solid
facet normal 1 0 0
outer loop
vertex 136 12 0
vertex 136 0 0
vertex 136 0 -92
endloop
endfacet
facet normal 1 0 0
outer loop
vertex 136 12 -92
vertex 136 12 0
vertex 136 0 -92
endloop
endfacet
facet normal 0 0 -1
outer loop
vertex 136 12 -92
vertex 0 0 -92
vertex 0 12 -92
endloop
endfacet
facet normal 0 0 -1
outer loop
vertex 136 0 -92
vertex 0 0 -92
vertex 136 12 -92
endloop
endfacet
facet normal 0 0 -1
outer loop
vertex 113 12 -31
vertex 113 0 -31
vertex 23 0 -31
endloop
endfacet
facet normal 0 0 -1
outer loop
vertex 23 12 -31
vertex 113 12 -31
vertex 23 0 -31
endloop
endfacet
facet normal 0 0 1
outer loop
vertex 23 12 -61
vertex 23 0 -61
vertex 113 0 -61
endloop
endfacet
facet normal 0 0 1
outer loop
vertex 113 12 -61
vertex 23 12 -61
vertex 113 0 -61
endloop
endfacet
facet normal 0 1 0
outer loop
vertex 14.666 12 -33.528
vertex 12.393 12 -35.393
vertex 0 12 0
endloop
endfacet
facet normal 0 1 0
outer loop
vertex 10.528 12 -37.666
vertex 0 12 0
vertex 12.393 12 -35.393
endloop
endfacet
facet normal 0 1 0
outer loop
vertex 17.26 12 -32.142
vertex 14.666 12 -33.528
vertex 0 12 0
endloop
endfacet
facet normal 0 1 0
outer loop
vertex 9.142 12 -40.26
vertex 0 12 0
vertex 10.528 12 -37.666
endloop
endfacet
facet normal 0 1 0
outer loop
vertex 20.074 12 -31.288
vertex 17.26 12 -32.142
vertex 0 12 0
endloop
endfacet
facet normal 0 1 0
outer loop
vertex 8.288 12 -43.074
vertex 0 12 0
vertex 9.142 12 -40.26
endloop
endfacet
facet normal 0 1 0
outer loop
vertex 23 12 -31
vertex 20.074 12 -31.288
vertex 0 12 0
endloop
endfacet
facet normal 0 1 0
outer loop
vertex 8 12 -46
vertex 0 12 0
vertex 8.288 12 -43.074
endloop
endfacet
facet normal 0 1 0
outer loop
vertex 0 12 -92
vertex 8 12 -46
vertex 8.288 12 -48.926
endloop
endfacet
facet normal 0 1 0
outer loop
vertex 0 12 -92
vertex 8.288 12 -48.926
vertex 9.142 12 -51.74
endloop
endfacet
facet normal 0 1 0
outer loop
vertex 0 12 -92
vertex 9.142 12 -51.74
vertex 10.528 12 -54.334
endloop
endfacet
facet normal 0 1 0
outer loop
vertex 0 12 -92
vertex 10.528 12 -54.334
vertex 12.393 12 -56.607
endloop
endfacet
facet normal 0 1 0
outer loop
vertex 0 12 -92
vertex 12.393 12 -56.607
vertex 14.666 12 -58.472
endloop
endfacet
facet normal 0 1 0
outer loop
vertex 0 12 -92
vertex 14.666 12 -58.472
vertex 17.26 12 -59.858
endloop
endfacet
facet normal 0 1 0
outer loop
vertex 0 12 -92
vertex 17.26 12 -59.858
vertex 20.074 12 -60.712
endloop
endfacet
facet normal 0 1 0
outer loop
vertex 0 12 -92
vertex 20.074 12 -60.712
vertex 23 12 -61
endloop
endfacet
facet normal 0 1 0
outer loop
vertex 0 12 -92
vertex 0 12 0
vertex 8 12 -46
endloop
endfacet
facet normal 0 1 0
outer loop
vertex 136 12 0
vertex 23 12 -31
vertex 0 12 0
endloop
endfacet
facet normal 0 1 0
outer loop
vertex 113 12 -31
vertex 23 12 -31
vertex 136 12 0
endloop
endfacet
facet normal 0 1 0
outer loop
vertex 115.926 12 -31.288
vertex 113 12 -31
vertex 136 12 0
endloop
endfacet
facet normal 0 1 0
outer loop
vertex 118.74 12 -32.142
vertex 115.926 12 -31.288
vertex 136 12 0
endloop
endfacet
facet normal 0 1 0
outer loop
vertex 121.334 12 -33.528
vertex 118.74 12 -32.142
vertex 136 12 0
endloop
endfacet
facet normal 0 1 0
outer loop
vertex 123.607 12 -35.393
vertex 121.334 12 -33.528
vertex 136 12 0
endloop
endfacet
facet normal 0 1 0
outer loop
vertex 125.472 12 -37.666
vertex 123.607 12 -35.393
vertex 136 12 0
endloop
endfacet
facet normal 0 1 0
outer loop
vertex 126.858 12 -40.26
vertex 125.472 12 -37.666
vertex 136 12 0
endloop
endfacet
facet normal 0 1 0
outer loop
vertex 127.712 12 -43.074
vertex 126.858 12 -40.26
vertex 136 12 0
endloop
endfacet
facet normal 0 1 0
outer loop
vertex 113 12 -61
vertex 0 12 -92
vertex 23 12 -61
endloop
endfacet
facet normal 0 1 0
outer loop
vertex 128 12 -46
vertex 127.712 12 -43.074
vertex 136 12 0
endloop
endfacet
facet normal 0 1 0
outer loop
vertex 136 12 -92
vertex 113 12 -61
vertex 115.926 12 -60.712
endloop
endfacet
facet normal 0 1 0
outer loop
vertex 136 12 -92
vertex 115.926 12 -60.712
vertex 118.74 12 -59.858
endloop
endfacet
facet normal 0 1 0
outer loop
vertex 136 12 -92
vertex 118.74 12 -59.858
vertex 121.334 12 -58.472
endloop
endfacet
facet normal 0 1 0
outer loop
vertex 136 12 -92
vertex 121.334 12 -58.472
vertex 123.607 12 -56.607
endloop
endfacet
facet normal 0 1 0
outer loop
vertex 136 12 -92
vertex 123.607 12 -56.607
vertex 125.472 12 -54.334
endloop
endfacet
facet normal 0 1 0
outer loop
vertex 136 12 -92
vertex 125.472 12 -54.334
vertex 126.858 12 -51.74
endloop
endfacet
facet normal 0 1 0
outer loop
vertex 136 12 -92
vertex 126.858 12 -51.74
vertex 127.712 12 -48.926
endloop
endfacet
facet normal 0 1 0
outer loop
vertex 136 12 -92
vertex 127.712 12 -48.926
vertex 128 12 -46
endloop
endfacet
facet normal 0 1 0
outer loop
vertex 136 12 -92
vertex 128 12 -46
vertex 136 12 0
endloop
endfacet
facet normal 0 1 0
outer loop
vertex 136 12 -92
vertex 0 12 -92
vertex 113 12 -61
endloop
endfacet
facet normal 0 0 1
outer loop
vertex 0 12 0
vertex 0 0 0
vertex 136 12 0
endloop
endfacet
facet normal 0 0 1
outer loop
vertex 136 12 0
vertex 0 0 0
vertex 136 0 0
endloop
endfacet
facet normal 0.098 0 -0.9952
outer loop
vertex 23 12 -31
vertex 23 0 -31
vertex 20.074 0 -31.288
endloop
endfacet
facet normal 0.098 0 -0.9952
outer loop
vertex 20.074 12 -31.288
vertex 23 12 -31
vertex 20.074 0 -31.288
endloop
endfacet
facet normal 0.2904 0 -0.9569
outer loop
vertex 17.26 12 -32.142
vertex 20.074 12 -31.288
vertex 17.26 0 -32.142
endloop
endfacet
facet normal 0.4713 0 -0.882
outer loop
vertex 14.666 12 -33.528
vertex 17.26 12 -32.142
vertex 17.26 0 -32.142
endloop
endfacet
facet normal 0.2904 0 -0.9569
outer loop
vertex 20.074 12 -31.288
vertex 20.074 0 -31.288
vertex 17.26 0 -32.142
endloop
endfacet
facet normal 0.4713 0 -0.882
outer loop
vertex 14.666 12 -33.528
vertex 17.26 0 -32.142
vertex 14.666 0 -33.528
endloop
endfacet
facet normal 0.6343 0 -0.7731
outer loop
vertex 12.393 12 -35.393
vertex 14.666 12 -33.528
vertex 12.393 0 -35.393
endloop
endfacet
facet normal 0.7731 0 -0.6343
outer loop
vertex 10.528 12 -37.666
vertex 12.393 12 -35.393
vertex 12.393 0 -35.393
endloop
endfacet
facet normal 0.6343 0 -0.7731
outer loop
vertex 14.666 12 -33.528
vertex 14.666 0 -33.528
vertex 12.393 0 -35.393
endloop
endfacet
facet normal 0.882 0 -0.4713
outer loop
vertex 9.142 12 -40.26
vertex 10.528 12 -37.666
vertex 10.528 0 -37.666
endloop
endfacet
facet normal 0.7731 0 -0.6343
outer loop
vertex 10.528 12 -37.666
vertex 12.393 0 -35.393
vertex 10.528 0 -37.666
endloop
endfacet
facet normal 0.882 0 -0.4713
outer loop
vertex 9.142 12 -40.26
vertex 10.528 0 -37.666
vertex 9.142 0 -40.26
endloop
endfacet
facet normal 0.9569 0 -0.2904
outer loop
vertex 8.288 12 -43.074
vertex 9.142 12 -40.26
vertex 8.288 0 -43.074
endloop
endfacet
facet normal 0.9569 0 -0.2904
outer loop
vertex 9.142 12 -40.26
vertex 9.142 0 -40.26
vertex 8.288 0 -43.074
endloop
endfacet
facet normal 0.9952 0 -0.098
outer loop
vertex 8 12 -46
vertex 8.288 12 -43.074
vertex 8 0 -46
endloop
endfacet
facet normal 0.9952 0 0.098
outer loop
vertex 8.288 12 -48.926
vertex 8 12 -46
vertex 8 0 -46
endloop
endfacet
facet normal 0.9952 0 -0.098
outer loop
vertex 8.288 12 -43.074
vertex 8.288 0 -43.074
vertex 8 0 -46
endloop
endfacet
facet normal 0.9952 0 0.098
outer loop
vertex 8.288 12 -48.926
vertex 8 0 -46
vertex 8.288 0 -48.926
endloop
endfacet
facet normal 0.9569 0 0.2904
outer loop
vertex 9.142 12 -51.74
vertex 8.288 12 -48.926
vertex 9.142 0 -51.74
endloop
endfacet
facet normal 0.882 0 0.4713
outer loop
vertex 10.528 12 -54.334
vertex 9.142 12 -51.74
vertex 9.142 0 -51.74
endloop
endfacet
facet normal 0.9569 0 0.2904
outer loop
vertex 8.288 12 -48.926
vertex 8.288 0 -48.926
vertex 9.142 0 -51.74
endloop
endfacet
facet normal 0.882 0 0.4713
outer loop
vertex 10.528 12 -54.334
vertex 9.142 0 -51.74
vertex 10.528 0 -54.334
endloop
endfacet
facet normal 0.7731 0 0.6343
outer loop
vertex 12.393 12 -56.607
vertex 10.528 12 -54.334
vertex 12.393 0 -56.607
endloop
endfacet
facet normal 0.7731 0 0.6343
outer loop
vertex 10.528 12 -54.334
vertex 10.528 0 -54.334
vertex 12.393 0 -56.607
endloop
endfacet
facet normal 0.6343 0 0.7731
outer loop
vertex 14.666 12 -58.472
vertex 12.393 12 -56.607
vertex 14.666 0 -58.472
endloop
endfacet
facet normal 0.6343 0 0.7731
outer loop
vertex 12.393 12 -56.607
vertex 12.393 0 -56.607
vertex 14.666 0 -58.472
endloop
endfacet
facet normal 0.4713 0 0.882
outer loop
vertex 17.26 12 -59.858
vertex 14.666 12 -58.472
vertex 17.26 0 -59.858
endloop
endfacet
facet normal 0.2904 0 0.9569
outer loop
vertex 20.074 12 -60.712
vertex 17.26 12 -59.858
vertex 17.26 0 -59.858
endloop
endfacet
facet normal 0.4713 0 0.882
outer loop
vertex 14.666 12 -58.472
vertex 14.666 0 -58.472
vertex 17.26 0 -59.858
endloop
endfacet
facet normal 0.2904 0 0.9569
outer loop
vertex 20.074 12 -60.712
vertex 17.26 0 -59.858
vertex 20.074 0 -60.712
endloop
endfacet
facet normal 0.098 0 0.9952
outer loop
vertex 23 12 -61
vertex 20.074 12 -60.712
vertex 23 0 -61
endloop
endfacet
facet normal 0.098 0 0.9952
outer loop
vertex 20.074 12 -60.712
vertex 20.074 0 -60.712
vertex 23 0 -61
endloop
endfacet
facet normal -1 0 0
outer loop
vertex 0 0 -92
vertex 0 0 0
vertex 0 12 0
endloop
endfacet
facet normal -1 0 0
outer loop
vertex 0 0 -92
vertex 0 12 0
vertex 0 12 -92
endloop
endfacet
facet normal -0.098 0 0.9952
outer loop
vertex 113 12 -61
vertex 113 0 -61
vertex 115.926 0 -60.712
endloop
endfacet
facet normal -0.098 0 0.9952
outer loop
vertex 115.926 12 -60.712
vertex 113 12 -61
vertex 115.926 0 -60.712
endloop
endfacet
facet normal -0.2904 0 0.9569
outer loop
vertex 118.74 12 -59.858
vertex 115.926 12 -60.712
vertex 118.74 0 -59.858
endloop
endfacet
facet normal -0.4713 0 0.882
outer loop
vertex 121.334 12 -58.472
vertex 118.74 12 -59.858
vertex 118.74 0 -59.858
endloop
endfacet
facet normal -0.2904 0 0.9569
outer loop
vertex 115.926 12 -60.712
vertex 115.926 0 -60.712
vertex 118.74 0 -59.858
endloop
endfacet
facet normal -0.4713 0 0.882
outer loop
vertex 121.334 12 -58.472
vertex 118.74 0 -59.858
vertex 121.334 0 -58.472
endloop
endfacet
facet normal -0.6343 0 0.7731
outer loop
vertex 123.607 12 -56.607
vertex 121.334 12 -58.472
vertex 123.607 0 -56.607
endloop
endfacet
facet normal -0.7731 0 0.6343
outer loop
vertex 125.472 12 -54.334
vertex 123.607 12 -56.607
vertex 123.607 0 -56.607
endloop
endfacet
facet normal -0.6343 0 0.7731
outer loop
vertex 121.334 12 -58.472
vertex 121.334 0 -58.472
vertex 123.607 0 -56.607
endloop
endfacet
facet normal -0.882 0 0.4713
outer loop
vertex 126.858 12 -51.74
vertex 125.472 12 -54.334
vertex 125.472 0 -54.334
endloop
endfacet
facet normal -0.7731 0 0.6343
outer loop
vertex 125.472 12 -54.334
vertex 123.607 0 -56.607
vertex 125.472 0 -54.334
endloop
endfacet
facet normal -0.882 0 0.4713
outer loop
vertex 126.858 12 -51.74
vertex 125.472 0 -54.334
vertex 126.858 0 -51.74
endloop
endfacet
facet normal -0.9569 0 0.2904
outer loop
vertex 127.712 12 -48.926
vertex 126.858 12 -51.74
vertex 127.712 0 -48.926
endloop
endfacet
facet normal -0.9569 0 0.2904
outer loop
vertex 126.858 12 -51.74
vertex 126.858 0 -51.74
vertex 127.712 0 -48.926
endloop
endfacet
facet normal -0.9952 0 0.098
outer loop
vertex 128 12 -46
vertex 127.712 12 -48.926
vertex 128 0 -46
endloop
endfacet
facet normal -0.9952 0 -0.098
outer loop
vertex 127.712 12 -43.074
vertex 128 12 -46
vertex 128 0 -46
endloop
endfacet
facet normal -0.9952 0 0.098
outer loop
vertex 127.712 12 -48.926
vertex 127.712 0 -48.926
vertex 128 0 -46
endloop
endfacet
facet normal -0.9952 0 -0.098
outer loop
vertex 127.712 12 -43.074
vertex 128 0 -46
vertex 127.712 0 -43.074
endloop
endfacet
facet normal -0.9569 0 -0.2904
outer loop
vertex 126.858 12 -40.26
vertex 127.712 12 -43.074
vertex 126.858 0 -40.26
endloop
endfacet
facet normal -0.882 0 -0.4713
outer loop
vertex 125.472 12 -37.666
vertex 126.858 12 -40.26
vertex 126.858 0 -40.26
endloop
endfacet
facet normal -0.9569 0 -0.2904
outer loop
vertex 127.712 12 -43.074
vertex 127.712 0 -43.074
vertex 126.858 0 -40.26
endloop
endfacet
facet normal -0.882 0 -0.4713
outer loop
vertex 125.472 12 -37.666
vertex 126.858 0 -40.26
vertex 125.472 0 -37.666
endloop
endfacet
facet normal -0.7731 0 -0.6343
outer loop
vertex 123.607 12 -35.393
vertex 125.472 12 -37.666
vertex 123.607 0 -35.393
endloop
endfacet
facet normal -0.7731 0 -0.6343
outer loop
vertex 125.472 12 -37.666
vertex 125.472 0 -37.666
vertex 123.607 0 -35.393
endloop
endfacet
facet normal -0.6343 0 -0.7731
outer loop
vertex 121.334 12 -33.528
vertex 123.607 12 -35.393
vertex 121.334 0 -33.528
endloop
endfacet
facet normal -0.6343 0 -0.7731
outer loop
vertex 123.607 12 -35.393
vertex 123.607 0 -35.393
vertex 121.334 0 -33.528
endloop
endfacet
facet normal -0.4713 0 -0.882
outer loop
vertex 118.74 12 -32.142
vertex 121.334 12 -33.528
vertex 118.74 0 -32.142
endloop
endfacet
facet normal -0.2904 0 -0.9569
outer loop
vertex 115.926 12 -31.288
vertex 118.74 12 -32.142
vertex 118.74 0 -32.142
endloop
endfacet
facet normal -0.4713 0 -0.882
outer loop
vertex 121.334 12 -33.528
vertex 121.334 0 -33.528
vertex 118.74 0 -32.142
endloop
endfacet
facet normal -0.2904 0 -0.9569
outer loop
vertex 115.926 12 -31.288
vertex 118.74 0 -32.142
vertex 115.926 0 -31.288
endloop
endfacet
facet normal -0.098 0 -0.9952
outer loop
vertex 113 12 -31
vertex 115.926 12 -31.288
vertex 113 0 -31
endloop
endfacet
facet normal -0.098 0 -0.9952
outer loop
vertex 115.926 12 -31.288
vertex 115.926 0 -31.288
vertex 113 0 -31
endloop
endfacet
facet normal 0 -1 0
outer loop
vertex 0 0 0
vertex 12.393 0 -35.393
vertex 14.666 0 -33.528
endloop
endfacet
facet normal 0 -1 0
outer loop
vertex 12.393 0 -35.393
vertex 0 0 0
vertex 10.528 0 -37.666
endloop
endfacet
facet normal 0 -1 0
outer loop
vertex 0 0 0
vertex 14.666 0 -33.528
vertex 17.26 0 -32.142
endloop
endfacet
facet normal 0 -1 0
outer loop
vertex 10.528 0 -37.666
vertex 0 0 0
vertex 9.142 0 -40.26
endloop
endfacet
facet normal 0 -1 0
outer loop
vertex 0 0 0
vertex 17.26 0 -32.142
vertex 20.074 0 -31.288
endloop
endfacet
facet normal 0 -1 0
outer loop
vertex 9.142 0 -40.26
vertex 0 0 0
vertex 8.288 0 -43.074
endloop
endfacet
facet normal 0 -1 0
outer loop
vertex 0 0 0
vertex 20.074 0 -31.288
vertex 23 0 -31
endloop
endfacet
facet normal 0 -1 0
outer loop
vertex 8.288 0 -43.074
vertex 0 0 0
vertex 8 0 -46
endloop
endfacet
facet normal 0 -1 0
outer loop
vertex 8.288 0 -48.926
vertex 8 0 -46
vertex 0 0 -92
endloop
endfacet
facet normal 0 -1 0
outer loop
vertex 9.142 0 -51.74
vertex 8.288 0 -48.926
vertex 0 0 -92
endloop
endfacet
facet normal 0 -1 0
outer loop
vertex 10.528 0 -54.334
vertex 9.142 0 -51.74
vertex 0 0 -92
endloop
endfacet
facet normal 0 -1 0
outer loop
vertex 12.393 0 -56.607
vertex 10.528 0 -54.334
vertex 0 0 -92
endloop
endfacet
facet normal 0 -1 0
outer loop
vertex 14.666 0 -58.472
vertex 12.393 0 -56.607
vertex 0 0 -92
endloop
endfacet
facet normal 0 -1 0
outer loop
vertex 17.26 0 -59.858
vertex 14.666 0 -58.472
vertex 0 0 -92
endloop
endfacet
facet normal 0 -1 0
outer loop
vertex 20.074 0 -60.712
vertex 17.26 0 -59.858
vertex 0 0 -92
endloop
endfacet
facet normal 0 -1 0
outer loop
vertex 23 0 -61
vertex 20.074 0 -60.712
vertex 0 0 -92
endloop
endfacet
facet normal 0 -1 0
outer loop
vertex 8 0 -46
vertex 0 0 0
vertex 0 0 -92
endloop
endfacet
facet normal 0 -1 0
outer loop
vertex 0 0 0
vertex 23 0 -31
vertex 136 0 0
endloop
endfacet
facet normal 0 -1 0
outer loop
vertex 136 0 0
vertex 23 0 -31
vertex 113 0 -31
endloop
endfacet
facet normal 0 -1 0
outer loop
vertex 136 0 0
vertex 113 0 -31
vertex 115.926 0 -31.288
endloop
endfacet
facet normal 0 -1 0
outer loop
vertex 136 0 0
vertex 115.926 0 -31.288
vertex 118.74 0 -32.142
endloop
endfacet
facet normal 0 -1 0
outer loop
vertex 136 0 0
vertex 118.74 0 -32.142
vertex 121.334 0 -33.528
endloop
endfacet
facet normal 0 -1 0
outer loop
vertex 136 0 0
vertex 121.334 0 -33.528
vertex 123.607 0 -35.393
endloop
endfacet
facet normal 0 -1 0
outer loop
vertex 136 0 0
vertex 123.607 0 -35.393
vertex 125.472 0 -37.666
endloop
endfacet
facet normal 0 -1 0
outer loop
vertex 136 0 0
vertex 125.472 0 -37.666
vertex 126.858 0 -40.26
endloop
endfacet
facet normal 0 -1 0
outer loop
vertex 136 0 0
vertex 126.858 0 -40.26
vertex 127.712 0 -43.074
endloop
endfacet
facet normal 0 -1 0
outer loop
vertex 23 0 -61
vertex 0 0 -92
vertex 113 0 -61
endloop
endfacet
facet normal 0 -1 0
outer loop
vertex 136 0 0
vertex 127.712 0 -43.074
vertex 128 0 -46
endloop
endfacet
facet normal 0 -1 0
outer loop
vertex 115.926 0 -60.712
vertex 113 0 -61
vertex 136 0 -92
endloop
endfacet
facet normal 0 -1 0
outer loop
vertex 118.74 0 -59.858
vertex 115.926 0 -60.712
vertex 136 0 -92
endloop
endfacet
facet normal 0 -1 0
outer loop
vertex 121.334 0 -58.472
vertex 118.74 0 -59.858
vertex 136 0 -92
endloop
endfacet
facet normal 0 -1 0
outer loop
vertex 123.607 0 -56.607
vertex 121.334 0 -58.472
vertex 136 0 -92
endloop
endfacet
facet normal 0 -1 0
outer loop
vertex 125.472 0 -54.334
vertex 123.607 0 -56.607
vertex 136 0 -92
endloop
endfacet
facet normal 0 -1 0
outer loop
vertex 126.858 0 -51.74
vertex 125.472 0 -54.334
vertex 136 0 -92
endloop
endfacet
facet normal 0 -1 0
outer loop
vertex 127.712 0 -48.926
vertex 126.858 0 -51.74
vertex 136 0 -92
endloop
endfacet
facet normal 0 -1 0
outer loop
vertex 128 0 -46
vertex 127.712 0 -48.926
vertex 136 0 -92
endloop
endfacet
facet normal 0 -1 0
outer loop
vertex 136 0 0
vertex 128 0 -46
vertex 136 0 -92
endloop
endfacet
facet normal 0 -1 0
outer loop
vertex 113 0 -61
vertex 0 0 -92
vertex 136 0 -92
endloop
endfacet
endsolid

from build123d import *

# Parameters (mm, degrees)
SKETCH2_W           = 136
SKETCH2_H           = 92
BOSS_EXTRUDE1_DEPTH = 12
CUT_EXTRUDE1_DEPTH  = 12


with BuildPart() as part:
    # Sketch2 → Boss-Extrude1 (new body)
    with BuildSketch(Plane(origin=(0, 0, 0), x_dir=(1, 0, 0), z_dir=(0, 1, 0))):
        with Locations((68, 46)):
            Rectangle(SKETCH2_W, SKETCH2_H)
    extrude(amount=BOSS_EXTRUDE1_DEPTH)

    # Sketch2<3> → Cut-Extrude1 (cut)
    with BuildSketch(Plane(origin=(0, 0, 0), x_dir=(1, 0, 0), z_dir=(0, 1, 0))):
        with BuildLine():
            Line((23, 61), (113, 61))
            ThreePointArc((113, 61), (128, 46), (113, 31))
            Line((113, 31), (23, 31))
            ThreePointArc((23, 31), (8, 46), (23, 61))
        make_face()
    extrude(amount=CUT_EXTRUDE1_DEPTH, mode=Mode.SUBTRACT)


solid = part.part
